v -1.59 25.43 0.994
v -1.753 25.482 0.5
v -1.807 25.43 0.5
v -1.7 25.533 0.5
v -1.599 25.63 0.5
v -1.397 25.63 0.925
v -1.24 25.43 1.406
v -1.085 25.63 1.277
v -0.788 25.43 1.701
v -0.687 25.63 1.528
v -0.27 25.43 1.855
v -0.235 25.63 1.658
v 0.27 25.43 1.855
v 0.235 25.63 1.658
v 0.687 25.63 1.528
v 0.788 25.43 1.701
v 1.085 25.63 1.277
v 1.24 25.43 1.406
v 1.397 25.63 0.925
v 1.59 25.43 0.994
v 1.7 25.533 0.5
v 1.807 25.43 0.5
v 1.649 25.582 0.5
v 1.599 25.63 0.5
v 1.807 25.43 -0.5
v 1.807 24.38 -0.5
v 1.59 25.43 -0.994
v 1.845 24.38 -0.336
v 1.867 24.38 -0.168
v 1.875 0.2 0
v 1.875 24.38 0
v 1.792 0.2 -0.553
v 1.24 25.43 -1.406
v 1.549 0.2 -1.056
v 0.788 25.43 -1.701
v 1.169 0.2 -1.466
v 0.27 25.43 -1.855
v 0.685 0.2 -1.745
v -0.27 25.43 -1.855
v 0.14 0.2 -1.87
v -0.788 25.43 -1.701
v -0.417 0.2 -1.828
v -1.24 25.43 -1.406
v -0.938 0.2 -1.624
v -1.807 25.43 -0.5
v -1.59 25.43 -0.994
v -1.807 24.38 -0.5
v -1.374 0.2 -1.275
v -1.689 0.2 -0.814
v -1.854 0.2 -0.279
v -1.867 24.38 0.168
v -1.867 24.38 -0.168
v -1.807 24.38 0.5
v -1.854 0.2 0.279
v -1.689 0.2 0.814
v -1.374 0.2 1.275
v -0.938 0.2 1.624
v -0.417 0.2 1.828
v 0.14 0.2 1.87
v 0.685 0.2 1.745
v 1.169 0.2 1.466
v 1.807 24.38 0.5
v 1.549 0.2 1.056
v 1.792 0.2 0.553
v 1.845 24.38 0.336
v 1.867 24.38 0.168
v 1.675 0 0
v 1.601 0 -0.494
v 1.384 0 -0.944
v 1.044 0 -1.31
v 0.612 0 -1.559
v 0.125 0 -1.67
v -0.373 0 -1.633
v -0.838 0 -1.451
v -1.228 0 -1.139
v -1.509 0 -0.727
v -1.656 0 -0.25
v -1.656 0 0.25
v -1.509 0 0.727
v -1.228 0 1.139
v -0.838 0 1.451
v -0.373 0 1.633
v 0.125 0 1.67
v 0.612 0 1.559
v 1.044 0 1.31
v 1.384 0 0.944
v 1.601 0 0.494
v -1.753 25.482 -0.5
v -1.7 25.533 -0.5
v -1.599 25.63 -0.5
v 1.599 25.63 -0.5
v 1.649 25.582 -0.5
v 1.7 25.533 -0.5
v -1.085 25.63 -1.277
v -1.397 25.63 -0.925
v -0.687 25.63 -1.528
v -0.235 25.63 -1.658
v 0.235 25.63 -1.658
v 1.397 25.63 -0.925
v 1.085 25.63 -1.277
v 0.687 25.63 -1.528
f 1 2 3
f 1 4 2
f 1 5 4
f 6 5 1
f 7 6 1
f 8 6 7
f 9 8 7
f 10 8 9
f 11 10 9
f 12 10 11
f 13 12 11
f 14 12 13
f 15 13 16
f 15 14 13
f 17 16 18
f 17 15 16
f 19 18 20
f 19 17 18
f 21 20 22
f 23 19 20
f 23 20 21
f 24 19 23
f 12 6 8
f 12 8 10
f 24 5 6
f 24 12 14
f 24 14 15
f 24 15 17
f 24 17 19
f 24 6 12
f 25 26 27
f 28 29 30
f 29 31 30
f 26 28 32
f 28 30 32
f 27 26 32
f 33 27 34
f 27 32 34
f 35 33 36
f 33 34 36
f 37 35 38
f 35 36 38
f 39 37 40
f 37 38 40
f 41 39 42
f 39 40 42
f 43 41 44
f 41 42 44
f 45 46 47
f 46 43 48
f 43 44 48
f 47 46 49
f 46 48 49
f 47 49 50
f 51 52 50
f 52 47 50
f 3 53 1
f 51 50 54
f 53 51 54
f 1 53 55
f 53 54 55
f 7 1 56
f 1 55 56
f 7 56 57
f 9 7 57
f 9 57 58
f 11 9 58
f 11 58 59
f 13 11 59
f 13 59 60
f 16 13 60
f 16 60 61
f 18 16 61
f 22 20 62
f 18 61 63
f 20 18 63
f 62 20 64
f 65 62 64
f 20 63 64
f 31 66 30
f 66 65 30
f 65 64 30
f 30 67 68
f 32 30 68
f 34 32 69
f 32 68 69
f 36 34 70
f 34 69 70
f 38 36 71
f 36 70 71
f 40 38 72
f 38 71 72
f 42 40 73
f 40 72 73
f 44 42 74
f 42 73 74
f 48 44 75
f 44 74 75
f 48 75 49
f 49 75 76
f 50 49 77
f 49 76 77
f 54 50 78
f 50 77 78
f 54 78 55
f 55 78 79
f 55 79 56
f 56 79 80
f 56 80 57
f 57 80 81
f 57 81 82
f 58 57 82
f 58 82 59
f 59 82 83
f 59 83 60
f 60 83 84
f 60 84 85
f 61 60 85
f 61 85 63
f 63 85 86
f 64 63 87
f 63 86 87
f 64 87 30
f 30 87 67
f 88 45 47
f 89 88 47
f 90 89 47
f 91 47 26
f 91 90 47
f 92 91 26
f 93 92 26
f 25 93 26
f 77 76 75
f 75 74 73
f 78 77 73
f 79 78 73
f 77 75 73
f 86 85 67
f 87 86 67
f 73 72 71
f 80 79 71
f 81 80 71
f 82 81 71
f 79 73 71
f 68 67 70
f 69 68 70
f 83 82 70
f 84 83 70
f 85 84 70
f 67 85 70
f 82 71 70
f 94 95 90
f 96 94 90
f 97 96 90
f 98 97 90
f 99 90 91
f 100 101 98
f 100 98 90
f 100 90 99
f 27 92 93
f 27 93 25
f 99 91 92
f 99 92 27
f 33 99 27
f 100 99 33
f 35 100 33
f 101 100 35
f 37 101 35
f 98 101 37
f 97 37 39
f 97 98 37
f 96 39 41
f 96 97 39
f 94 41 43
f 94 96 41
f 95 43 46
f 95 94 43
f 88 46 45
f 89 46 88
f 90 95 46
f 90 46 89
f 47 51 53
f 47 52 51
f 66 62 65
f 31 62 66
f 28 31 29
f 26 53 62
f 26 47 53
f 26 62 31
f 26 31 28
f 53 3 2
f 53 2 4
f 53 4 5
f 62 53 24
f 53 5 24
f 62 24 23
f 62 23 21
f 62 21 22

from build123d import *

# Parameters (mm, degrees)
SKETCH1_R           = 1.875
BOSS_EXTRUDE1_DEPTH = 25.63
CHAMFER1_SIZE       = 0.2
CHAMFER2_SIZE       = 0.2
SKETCH2_W           = 3.856306074
SKETCH2_H           = 1
CUT_EXTRUDE1_DEPTH  = 1.25


with BuildPart() as part:
    # Sketch1 → Boss-Extrude1 (new body)
    with BuildSketch(Plane(origin=(0, 0, 0), x_dir=(1, 0, 0), z_dir=(0, 1, 0))):
        Circle(SKETCH1_R)
    extrude(amount=BOSS_EXTRUDE1_DEPTH)

    # Chamfer1
    chamfer1_edges = [part.edges().sort_by_distance(p)[0] for p in [
        (-1.875, 25.63, 0),
    ]]
    chamfer(chamfer1_edges, length=CHAMFER1_SIZE)

    # Chamfer2
    chamfer2_edges = [part.edges().sort_by_distance(p)[0] for p in [
        (-1.875, 0, 0),
    ]]
    chamfer(chamfer2_edges, length=CHAMFER2_SIZE)

    # Sketch2 → Cut-Extrude1 (cut)
    with BuildSketch(Plane(origin=(0, 25.63, 0), x_dir=(1, 0, 0), z_dir=(0, 1, 0))):
        Rectangle(SKETCH2_W, SKETCH2_H)
    extrude(amount=-CUT_EXTRUDE1_DEPTH, mode=Mode.SUBTRACT)


solid = part.part
